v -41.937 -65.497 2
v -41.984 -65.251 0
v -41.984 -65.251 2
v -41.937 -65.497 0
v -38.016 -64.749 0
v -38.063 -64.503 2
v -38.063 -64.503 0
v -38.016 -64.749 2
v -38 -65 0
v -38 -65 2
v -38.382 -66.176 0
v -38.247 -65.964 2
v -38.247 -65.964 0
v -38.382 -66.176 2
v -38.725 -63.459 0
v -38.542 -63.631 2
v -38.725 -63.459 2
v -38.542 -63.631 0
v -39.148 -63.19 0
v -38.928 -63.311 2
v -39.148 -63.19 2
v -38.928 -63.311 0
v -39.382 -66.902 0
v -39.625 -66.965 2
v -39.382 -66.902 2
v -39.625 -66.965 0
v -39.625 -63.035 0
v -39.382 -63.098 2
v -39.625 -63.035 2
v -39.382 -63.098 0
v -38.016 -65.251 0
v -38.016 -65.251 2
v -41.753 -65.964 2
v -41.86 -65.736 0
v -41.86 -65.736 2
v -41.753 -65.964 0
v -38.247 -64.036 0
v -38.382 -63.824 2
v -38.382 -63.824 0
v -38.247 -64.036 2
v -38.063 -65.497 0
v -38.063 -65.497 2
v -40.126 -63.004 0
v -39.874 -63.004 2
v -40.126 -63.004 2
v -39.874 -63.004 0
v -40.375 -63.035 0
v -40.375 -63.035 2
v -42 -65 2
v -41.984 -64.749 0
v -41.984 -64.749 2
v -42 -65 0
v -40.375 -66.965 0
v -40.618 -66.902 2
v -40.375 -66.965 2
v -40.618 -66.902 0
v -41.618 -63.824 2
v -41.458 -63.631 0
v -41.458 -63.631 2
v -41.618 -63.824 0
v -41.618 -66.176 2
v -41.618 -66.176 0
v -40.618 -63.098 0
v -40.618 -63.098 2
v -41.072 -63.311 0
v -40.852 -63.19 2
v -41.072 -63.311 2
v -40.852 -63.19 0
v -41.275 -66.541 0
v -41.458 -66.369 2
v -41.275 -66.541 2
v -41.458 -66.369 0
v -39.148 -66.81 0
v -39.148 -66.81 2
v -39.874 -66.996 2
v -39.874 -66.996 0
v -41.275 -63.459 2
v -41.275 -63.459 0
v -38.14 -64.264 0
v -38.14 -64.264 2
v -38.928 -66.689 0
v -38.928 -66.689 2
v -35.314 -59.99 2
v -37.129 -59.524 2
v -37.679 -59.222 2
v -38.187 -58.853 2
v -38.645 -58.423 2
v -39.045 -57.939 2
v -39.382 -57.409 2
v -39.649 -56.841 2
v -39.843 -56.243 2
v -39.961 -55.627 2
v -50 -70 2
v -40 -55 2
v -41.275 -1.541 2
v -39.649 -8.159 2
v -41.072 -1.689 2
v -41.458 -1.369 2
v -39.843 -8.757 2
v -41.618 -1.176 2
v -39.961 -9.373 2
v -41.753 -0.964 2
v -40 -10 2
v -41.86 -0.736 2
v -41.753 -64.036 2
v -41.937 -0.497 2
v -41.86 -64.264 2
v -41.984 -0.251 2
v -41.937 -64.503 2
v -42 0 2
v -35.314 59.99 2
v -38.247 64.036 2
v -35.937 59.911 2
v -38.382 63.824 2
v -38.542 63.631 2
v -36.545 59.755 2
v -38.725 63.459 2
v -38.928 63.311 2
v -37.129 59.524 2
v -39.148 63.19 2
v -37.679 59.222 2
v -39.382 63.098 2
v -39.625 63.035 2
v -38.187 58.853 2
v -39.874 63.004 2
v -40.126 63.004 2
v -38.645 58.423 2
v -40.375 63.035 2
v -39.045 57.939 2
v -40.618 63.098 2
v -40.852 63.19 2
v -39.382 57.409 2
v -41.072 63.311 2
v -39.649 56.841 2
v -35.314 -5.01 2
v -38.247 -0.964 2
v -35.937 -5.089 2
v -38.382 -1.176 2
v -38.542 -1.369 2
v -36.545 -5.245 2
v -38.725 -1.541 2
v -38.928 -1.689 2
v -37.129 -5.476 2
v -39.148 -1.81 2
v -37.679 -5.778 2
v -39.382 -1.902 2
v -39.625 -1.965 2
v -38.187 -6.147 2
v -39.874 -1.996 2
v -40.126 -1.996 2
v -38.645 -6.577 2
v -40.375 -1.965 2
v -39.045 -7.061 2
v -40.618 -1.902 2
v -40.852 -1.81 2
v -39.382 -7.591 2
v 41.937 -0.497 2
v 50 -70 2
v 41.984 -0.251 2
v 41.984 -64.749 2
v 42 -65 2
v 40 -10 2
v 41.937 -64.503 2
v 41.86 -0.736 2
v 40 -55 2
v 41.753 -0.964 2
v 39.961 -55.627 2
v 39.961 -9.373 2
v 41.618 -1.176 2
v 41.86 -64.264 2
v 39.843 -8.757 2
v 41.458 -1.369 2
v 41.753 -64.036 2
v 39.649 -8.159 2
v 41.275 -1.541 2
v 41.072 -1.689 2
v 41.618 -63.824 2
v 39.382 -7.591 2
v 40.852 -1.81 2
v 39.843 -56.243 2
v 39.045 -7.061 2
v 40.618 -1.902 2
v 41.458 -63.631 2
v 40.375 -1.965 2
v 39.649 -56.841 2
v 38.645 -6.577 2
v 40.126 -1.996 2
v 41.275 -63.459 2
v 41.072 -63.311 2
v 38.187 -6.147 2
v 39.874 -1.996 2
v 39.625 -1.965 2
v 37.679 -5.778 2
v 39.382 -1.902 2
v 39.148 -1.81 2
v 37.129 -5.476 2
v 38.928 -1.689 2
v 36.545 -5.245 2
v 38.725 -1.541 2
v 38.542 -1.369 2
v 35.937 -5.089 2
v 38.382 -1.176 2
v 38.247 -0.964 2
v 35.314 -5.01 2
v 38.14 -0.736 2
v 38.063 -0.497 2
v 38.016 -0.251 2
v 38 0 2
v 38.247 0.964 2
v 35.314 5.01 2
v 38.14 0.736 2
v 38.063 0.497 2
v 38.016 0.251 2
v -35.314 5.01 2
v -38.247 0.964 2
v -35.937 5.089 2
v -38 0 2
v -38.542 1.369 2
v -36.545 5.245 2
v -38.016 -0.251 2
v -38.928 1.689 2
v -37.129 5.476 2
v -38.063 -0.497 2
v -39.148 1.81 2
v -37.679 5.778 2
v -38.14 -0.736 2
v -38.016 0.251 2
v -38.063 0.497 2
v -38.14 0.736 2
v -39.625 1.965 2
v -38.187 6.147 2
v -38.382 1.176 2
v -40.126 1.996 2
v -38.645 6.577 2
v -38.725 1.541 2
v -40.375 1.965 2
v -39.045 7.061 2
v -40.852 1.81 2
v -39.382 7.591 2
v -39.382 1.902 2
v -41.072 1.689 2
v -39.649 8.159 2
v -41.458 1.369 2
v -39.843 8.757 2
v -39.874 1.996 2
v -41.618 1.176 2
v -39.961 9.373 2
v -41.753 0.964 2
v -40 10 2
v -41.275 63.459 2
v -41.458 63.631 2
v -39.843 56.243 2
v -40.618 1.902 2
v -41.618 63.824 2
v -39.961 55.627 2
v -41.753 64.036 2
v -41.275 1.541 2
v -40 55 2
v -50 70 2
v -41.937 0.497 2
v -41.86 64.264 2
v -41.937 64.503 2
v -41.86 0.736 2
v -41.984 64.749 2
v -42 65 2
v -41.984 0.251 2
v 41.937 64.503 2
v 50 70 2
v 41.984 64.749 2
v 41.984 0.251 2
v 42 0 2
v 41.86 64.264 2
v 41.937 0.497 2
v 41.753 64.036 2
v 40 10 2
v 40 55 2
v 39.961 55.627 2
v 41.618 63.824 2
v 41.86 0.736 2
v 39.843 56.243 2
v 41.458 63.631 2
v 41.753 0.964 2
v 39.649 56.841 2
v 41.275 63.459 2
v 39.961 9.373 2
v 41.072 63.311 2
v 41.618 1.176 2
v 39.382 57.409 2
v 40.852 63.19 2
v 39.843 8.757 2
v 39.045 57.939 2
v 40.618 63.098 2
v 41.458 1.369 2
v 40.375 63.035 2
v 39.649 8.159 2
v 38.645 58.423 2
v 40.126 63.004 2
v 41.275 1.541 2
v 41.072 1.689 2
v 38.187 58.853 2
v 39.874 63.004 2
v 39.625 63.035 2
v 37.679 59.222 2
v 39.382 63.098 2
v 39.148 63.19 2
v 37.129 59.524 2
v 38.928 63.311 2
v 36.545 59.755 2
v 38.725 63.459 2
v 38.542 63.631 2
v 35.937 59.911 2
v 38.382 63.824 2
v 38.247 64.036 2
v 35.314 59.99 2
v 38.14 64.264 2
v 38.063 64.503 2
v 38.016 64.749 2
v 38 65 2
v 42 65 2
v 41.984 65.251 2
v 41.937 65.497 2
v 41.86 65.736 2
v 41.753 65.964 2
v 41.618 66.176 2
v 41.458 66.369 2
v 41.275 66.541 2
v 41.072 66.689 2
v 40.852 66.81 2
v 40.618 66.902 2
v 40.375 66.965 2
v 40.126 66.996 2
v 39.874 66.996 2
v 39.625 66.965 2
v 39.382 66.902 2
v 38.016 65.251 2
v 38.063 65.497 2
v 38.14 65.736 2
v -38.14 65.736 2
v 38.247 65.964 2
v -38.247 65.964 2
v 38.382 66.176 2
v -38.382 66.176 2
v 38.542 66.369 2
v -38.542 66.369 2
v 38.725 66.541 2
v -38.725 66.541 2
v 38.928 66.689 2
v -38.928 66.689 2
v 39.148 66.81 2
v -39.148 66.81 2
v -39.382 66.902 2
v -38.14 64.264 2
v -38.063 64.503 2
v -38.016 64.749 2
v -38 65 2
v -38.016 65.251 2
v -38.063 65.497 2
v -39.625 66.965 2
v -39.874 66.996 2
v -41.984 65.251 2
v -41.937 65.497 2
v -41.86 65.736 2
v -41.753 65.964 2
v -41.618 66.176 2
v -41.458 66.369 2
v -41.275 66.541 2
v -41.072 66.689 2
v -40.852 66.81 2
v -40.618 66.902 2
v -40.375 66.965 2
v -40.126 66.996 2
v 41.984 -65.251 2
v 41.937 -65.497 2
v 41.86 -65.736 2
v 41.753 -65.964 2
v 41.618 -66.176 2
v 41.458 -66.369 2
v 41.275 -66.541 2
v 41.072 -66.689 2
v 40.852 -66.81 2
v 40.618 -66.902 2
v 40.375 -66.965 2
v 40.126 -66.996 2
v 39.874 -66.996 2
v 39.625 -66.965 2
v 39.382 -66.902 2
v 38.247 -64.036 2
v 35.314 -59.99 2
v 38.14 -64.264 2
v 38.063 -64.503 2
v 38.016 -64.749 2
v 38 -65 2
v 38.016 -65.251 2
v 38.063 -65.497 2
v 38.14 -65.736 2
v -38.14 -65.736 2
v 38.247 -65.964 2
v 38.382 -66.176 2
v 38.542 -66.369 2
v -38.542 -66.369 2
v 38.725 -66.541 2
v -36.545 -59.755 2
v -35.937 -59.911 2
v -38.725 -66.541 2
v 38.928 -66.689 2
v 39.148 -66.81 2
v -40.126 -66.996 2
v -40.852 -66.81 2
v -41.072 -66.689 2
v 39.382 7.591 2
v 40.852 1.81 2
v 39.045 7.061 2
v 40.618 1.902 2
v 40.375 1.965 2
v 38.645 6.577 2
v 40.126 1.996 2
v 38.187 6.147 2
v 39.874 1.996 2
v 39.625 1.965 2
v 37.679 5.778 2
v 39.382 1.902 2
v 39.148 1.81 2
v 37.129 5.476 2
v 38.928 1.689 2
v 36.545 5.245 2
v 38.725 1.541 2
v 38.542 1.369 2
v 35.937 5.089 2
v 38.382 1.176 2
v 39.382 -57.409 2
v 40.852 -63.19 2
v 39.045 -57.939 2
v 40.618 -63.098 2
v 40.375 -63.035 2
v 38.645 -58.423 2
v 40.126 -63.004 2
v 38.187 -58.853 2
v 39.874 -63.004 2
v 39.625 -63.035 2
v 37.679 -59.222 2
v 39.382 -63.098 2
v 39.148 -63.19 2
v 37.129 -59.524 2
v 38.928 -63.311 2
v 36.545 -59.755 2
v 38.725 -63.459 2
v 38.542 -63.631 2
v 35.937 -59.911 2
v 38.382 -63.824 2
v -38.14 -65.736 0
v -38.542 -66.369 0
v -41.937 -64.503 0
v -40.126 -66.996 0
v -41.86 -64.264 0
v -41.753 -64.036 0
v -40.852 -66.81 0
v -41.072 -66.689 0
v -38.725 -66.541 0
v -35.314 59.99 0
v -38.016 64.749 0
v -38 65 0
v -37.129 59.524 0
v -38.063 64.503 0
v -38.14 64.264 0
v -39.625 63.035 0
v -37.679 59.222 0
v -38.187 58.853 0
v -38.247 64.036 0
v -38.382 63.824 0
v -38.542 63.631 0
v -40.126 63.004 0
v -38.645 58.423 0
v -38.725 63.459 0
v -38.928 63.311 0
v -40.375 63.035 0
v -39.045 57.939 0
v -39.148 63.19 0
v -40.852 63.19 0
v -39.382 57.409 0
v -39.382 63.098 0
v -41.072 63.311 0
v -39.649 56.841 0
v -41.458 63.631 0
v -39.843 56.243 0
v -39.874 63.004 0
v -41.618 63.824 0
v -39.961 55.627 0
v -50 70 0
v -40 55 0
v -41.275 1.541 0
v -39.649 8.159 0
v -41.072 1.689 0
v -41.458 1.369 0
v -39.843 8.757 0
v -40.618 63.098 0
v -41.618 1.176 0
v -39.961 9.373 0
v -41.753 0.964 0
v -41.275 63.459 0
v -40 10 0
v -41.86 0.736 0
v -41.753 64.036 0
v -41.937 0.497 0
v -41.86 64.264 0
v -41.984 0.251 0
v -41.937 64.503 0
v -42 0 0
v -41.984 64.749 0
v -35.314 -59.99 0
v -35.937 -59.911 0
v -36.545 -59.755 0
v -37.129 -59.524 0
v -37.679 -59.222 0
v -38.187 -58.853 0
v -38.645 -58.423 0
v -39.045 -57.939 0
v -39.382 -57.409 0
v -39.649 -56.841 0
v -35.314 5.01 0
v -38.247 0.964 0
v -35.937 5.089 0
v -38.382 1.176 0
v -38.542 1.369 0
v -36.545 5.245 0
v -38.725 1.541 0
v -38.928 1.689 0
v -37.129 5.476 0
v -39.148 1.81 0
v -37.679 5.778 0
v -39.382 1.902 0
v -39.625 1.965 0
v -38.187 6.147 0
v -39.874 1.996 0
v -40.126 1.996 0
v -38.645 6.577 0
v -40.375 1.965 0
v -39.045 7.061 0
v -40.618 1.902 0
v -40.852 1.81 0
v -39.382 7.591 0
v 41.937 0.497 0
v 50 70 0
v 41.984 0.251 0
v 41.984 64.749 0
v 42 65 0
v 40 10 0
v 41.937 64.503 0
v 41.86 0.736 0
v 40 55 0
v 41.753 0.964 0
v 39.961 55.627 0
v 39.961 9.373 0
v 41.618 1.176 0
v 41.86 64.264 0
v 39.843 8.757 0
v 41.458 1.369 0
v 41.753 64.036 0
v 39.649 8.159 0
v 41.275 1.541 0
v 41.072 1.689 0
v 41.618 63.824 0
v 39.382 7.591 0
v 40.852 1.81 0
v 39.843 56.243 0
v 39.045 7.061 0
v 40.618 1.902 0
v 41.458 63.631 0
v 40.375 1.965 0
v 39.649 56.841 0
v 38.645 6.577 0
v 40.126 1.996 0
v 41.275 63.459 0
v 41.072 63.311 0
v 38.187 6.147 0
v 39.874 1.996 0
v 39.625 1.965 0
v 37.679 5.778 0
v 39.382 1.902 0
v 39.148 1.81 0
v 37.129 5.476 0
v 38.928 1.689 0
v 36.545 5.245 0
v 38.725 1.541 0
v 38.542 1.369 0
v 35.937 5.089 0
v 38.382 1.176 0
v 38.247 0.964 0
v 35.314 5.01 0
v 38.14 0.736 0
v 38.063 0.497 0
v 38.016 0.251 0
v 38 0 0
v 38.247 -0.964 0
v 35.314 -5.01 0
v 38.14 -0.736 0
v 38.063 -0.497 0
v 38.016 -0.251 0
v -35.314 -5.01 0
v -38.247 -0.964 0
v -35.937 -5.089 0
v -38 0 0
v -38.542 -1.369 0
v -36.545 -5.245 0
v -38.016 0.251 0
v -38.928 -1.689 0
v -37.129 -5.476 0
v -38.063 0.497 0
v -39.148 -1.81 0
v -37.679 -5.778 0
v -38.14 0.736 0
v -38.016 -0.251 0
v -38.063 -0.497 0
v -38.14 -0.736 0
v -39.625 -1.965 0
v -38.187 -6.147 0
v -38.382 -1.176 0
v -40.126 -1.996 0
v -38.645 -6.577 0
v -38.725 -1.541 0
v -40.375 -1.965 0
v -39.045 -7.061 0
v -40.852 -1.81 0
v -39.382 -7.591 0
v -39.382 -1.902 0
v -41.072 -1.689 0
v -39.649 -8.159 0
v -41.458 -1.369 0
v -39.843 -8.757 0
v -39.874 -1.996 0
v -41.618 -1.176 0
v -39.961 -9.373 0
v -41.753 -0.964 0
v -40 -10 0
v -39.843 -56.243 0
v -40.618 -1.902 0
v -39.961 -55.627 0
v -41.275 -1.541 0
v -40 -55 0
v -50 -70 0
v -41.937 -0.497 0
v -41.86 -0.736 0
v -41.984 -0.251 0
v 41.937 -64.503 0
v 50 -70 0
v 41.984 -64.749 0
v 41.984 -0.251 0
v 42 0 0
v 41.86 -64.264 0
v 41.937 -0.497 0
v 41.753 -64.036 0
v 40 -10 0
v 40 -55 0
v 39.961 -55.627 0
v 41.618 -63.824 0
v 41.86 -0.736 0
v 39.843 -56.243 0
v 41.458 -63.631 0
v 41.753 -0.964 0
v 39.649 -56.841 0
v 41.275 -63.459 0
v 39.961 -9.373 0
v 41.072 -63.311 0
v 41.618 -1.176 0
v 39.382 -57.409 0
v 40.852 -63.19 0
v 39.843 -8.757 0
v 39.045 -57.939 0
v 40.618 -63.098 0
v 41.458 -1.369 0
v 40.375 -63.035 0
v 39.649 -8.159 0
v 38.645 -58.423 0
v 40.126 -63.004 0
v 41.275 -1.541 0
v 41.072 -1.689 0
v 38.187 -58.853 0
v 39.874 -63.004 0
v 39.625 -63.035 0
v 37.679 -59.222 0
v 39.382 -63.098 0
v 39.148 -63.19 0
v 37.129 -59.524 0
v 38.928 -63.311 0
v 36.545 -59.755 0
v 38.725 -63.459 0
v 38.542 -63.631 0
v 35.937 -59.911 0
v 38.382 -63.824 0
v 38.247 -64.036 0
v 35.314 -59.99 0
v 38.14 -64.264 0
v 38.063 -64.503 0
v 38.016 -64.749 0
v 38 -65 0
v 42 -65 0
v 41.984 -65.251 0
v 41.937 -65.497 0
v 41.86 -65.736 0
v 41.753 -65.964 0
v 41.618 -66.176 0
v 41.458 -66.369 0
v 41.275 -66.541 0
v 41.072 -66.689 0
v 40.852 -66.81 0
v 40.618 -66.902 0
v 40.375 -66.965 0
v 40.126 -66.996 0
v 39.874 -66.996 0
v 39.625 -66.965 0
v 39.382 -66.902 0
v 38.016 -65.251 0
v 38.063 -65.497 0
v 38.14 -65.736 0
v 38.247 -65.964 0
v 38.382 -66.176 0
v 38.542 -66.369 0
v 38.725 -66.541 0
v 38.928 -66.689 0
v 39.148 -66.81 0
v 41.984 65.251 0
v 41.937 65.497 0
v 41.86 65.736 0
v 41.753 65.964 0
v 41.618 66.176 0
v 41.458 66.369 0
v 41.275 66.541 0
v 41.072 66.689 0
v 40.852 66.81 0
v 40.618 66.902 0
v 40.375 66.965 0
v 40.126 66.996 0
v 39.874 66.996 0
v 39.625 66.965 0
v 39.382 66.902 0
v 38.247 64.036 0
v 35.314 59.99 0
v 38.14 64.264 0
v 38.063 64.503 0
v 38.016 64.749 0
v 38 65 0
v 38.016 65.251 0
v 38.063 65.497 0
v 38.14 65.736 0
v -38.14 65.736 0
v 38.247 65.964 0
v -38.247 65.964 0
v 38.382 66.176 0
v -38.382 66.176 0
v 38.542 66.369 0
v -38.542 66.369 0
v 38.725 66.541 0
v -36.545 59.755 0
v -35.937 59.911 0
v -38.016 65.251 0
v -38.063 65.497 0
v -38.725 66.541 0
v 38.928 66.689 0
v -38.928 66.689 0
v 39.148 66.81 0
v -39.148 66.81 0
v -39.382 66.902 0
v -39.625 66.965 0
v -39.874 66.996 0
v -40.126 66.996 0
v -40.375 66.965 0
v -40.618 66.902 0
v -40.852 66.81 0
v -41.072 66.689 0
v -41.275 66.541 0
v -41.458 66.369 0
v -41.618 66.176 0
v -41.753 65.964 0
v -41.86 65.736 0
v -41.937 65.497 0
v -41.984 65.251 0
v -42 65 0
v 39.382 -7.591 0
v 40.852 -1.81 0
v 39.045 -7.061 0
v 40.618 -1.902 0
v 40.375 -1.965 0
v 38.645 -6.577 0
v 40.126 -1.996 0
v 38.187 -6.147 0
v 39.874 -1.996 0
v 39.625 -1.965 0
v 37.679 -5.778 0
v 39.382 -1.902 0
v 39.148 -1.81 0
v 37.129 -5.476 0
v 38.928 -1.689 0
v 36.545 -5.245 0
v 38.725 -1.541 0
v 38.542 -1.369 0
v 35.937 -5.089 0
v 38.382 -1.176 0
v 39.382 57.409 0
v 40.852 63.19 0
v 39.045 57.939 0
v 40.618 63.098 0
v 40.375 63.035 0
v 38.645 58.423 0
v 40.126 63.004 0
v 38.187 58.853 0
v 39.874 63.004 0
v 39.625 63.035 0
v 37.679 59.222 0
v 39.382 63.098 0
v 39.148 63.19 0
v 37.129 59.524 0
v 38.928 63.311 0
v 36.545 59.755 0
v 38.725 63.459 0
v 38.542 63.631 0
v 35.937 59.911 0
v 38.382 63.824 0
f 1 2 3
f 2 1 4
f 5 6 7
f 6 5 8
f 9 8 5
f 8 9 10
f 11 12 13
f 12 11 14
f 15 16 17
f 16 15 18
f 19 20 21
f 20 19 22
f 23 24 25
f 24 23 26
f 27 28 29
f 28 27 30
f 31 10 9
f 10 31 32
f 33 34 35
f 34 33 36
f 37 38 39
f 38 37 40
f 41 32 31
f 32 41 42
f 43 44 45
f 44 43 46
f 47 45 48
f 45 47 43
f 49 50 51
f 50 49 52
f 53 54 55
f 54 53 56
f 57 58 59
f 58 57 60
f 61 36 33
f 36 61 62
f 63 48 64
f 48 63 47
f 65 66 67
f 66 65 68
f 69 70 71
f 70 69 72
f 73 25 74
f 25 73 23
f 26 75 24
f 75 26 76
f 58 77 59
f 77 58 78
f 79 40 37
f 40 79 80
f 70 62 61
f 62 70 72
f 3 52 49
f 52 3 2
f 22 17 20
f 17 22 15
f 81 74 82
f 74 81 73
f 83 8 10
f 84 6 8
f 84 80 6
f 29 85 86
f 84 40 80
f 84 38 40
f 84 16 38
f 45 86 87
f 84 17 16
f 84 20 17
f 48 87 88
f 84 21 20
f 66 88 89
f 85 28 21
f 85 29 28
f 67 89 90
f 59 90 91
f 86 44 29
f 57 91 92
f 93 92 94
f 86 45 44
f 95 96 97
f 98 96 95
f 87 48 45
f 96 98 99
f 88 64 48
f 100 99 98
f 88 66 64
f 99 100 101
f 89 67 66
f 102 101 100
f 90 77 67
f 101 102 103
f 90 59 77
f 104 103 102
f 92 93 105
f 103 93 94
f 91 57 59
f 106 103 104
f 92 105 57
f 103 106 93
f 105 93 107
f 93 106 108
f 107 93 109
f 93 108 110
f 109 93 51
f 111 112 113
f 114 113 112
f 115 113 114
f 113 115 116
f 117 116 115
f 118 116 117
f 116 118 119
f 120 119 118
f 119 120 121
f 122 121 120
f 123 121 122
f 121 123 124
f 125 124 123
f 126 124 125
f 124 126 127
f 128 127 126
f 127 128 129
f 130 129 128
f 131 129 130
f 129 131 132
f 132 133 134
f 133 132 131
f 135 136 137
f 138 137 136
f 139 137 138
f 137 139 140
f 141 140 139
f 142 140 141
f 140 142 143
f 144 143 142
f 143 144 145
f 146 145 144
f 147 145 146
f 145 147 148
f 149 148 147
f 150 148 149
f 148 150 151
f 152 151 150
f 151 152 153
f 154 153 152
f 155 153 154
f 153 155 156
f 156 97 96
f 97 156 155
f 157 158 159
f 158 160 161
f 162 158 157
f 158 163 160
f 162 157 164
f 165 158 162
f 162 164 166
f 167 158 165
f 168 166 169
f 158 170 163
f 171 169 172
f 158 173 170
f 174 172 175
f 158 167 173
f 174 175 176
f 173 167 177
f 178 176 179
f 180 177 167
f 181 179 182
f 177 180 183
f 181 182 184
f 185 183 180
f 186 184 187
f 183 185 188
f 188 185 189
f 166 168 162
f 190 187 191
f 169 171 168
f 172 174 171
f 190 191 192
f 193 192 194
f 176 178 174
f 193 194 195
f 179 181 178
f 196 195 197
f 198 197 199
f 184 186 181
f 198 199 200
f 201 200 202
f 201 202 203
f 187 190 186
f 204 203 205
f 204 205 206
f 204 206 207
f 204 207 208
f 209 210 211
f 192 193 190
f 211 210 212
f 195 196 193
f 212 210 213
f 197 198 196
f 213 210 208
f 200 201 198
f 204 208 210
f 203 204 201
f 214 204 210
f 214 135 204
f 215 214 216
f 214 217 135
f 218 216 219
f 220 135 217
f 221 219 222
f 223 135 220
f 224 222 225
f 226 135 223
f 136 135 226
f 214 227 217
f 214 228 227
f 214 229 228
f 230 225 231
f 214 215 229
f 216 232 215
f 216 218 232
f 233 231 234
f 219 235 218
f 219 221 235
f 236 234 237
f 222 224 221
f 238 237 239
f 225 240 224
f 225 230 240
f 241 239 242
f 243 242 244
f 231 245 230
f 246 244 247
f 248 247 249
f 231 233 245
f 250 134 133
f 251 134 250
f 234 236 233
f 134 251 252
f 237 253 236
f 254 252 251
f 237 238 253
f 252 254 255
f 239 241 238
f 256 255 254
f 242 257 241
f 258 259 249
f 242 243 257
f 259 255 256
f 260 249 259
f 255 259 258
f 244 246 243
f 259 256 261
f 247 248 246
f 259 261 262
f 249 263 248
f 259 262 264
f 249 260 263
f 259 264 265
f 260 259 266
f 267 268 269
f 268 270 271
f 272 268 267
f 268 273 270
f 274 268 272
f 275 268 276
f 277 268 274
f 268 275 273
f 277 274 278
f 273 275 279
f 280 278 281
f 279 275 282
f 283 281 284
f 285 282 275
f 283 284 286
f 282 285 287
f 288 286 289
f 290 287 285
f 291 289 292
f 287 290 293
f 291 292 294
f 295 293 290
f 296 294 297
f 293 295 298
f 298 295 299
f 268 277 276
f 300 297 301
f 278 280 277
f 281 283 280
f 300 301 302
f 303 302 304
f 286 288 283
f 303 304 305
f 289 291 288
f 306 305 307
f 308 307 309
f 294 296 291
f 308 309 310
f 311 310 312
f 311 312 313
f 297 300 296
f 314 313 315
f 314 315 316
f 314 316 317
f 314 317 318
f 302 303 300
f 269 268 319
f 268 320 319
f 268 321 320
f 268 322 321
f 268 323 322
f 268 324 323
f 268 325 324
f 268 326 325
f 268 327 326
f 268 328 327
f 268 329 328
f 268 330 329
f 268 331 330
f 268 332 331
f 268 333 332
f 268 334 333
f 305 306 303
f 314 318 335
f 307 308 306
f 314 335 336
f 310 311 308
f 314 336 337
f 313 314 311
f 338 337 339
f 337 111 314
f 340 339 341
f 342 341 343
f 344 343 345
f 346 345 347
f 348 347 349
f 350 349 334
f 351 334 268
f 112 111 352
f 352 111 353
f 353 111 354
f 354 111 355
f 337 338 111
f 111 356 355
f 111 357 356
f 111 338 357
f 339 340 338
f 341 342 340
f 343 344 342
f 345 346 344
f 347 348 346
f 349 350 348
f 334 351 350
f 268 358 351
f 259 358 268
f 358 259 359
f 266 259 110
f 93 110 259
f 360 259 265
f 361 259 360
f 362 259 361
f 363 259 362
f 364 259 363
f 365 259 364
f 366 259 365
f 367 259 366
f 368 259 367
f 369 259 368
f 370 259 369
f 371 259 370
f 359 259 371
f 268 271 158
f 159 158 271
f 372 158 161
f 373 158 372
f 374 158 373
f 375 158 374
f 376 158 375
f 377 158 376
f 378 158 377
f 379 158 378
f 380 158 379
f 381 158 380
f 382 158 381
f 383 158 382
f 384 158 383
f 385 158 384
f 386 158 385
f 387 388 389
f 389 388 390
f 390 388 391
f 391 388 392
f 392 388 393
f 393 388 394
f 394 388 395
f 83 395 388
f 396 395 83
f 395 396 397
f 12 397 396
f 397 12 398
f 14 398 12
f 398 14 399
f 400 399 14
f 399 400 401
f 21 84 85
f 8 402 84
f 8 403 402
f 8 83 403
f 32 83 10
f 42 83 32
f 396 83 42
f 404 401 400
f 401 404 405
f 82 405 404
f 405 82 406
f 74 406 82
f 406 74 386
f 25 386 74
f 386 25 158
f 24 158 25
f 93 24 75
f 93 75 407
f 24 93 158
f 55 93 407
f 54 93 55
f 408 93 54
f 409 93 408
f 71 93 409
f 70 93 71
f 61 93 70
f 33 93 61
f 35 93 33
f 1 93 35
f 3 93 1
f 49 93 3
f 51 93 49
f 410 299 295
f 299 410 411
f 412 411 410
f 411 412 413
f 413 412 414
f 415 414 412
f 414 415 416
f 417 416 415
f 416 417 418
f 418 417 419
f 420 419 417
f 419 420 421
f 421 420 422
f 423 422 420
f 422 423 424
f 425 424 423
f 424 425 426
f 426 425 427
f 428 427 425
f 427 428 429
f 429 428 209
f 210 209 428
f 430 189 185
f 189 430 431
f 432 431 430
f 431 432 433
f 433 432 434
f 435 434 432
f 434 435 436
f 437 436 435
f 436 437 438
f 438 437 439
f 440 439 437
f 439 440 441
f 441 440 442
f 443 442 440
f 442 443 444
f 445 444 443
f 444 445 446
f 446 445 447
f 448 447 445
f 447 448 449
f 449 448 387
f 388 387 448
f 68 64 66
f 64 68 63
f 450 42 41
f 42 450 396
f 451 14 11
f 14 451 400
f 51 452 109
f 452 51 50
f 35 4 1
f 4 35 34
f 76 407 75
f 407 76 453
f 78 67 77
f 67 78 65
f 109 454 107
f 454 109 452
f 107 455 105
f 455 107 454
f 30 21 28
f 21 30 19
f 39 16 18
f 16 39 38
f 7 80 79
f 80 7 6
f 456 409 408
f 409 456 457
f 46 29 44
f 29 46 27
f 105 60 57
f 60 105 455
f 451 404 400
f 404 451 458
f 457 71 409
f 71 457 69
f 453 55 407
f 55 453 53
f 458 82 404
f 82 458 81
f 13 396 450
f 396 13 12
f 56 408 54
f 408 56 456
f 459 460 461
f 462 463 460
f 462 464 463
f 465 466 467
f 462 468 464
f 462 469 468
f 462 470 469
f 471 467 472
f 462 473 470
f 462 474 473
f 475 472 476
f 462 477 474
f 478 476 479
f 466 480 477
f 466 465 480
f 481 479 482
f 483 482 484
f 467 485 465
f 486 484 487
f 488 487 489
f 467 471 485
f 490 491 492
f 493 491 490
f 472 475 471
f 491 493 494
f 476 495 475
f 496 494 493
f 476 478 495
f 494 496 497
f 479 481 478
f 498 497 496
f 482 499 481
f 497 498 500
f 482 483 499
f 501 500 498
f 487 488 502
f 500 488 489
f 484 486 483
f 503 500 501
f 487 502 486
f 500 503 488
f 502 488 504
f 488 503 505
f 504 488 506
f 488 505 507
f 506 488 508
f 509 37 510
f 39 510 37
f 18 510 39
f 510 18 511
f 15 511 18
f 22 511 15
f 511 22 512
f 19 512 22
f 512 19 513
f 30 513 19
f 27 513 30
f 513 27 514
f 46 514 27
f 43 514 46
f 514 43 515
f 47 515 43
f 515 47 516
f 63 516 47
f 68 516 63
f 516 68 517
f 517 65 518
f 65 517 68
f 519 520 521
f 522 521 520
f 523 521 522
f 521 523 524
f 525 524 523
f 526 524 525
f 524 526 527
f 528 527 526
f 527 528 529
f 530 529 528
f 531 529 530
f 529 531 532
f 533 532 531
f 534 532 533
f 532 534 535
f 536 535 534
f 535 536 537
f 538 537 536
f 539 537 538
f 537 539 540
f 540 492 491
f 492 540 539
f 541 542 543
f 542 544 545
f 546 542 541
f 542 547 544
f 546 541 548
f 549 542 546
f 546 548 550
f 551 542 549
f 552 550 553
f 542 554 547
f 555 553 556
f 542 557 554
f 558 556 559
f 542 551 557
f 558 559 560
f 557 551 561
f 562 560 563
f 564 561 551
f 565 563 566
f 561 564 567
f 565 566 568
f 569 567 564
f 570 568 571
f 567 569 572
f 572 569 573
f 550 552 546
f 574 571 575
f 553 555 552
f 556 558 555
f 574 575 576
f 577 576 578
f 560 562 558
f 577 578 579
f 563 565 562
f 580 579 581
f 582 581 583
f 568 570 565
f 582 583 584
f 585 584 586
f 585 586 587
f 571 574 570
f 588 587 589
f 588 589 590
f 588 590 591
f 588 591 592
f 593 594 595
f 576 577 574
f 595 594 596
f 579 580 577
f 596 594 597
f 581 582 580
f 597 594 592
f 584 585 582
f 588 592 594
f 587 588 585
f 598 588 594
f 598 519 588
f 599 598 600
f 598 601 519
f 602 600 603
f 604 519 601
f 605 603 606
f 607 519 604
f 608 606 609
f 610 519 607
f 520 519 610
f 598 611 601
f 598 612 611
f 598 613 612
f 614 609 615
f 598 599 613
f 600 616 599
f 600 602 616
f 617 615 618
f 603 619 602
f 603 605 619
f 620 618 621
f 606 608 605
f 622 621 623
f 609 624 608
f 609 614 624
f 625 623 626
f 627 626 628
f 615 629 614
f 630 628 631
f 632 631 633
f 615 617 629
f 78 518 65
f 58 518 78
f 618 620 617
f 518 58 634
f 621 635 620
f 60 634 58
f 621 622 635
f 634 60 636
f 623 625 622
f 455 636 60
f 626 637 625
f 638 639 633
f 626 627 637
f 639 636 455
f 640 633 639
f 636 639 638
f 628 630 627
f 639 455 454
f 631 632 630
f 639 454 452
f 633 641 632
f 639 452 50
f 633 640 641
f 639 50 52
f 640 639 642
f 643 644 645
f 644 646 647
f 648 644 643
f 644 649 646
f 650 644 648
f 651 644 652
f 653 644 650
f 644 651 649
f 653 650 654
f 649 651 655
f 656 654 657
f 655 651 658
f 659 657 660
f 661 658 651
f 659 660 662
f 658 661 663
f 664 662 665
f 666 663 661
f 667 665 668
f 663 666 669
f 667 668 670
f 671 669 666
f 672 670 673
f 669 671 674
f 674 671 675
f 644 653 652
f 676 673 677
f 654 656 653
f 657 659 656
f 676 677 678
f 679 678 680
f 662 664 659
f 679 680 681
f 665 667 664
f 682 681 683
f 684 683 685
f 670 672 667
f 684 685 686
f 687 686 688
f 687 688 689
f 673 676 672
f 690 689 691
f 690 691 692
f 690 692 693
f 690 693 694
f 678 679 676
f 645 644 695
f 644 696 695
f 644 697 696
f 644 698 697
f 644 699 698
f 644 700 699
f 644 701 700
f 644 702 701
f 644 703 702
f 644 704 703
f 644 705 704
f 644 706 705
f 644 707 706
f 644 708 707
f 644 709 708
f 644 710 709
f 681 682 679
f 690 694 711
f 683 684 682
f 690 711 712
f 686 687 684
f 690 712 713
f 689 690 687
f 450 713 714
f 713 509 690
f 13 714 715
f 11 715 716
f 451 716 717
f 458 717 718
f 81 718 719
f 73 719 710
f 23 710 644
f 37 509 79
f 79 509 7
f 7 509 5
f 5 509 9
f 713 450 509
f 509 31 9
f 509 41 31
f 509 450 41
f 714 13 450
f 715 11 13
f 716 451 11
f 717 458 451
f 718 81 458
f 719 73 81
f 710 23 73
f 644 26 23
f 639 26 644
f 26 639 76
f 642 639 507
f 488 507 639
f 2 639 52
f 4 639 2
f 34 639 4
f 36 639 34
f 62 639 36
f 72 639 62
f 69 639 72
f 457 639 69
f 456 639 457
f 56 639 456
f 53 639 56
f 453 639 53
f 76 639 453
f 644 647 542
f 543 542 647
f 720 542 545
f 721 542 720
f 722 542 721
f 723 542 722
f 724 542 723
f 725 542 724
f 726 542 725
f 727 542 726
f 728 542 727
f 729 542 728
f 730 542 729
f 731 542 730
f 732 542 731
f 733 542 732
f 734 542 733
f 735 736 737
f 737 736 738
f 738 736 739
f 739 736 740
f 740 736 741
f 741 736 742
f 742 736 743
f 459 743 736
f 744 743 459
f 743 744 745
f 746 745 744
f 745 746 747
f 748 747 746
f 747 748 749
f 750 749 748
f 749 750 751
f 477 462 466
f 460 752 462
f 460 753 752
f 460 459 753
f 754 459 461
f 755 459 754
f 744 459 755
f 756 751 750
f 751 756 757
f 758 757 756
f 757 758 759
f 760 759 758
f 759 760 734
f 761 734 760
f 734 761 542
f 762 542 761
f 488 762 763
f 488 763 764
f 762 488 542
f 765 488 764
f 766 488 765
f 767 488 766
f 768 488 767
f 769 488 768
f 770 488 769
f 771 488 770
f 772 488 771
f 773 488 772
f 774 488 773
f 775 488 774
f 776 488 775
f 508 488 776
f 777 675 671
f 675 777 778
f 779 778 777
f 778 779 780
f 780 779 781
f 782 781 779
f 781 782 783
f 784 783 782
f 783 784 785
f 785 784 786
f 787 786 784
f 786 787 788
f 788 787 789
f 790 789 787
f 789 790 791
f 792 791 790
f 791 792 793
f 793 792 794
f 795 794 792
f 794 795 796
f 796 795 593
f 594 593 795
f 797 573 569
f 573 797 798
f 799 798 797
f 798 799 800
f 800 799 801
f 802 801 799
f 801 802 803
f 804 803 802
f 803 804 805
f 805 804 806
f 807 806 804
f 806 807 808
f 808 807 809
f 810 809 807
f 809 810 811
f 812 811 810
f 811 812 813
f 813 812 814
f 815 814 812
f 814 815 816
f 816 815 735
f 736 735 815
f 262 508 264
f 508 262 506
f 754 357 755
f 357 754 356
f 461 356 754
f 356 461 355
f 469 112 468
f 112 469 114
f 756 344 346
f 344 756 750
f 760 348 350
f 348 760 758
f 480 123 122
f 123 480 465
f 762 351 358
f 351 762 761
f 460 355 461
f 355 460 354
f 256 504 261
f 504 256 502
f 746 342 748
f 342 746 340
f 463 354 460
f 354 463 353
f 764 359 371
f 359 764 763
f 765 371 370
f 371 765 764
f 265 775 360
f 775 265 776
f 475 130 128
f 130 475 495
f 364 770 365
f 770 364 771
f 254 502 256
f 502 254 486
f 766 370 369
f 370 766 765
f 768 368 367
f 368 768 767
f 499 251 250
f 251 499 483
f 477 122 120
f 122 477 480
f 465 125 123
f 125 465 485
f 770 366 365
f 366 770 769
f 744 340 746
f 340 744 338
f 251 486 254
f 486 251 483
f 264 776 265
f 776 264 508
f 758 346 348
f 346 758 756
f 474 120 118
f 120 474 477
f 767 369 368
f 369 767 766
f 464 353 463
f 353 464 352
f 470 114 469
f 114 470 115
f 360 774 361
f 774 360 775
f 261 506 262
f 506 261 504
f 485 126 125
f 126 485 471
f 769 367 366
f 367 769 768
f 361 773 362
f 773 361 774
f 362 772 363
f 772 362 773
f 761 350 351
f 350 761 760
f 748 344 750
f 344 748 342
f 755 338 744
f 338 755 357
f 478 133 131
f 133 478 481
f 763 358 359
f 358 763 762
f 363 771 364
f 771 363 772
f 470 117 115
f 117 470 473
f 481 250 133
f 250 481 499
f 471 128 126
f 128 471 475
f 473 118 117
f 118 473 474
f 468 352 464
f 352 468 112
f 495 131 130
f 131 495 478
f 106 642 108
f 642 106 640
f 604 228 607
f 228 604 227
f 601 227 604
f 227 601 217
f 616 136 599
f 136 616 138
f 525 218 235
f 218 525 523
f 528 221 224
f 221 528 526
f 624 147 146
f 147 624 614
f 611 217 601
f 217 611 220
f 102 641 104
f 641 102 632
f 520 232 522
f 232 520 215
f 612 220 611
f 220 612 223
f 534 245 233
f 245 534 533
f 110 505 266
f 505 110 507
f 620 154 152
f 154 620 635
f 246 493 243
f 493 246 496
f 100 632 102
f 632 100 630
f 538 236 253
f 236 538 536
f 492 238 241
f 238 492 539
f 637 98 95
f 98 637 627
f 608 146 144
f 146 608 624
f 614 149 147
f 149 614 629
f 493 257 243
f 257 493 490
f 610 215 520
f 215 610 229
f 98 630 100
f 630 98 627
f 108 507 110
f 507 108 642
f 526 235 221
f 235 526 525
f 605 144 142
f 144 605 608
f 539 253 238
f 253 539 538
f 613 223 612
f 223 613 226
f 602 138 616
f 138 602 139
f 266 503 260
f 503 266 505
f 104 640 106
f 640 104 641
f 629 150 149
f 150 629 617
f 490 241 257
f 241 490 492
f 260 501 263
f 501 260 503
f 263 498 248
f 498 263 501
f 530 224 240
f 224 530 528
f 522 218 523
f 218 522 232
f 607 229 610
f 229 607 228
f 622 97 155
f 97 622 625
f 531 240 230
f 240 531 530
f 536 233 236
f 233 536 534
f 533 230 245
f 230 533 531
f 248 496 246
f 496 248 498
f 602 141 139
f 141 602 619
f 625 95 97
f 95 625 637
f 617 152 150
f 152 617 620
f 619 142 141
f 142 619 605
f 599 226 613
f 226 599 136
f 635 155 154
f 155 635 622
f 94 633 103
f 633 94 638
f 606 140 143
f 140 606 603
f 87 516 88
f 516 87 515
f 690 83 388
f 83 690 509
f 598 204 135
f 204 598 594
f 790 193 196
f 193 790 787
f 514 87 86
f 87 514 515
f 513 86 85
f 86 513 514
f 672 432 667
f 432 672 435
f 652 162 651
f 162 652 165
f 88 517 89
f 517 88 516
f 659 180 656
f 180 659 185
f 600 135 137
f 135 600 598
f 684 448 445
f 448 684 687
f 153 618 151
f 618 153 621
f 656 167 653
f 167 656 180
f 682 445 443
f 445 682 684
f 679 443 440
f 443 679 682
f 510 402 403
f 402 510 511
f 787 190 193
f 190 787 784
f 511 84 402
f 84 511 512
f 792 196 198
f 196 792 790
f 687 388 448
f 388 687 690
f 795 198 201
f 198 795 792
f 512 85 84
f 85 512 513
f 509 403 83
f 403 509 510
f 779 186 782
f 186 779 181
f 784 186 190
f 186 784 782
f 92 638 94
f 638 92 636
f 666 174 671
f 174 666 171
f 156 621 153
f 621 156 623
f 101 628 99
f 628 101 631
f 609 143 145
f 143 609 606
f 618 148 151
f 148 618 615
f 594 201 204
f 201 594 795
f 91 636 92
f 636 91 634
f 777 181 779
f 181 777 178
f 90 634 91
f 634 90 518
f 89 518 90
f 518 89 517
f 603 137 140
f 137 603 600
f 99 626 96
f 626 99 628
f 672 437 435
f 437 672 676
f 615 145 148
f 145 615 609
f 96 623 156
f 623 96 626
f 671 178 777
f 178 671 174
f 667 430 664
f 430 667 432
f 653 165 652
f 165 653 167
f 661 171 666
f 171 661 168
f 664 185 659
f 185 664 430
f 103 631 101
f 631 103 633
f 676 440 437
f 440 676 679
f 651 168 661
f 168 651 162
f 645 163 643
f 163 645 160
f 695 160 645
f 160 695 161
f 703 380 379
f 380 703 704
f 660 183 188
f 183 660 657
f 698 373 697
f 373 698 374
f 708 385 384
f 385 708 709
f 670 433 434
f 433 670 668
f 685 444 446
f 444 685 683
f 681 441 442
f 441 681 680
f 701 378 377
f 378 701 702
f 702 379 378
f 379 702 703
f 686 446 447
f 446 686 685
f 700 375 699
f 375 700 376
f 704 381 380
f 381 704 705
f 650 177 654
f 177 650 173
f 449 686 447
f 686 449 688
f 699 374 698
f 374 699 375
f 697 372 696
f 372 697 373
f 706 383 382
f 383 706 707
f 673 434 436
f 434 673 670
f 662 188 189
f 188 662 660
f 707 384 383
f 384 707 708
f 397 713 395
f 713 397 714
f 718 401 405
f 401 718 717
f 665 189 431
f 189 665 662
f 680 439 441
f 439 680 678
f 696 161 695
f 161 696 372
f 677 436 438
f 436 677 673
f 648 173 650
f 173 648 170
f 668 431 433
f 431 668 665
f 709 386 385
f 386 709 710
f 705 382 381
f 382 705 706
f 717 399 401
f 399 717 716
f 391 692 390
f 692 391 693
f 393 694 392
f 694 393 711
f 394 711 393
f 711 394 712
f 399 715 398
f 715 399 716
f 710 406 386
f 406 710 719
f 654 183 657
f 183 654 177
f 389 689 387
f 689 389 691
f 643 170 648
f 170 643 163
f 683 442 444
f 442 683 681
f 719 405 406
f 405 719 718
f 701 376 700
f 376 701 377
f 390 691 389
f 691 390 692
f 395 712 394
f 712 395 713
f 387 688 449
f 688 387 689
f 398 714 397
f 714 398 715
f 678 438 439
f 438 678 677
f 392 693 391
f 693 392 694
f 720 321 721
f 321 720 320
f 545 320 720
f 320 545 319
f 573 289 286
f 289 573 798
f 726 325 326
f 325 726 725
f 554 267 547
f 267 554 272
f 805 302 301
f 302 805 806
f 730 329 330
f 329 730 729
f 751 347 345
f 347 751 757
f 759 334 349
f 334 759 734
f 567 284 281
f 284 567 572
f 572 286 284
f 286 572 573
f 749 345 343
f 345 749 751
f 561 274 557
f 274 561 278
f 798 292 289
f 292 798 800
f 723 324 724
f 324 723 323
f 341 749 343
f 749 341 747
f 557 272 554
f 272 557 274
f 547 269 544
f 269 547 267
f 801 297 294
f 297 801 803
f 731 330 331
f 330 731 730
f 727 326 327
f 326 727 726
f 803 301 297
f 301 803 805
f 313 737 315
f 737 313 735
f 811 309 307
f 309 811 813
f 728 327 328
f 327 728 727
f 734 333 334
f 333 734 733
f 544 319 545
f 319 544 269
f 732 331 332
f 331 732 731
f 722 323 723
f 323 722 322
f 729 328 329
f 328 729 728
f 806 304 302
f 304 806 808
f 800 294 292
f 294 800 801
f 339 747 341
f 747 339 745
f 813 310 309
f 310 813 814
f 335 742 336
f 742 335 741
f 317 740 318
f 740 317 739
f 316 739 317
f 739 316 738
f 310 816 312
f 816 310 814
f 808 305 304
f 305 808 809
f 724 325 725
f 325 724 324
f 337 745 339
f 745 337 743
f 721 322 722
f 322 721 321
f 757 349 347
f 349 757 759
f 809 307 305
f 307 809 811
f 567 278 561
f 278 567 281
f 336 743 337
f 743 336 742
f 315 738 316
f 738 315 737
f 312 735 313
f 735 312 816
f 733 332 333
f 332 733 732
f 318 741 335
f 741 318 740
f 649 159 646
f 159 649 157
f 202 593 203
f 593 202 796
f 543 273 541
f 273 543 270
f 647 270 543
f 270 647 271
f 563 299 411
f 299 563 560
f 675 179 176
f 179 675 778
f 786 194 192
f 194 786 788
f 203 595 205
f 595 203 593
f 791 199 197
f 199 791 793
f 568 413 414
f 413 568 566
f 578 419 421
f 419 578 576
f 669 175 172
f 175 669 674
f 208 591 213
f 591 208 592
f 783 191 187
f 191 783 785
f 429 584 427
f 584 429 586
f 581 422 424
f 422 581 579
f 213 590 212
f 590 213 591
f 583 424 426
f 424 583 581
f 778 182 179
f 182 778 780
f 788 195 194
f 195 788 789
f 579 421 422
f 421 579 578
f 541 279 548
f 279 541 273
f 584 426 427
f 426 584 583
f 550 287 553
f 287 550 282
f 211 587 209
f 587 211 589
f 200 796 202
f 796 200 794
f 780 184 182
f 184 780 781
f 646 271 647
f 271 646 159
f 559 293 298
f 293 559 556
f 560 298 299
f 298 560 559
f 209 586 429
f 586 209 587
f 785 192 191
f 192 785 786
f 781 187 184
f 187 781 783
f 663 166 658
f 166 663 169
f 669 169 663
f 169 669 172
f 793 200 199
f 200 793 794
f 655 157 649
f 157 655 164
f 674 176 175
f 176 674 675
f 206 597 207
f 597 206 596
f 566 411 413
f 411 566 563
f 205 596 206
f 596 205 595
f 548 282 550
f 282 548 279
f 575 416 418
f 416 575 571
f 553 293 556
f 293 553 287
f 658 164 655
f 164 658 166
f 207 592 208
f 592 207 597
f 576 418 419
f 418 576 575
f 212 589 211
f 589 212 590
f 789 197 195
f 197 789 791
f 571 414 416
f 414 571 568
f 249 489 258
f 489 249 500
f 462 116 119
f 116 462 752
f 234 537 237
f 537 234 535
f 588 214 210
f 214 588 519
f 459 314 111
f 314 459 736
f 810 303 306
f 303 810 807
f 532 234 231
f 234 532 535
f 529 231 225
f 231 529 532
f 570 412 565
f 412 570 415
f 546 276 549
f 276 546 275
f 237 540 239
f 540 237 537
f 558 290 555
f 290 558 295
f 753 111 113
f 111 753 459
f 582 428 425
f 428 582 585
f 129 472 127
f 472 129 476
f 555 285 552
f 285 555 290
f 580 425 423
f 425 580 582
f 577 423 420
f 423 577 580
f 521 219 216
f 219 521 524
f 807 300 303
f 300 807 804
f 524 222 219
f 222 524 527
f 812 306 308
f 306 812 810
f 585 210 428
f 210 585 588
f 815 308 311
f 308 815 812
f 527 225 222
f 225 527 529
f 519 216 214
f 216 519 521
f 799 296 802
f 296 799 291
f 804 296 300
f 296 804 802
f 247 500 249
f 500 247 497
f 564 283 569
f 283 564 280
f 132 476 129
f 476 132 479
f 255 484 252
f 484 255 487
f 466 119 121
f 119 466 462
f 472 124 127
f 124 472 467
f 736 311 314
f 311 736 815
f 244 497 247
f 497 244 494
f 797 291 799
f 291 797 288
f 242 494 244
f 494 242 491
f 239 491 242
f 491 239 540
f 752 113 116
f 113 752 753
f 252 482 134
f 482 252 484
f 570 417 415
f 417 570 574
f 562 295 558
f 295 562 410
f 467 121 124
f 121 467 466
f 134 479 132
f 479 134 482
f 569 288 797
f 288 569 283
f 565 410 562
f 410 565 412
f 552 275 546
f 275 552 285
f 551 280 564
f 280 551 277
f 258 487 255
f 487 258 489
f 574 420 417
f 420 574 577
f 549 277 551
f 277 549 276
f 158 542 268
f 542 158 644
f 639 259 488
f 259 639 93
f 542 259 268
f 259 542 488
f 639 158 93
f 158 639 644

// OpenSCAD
FRAME_WIDTH = 100;
FRAME_LENGTH = 140;
FRAME_THICKNESS = 2;

MOUNT_HOLE_DIA = 4;
MOUNT_HOLE_SPACING_X = 80;
MOUNT_HOLE_SPACING_Y = 130;

HOLE_CORNER_DIA = 10;
HOLE_WIDTH = FRAME_WIDTH - 20;
HOLE_LENGTH = (FRAME_LENGTH - 30)/2;
HOLE_SPACING = HOLE_LENGTH + 10;

$fn = 50;

module hole() {
  hull() {
    for(i = [-1, 1]) {
      for(j = [-1, 1]) {
        translate([i * (HOLE_WIDTH-HOLE_CORNER_DIA)/2, j * (HOLE_LENGTH-HOLE_CORNER_DIA)/2, 0])
        cylinder(d = HOLE_CORNER_DIA, h = FRAME_THICKNESS);
      }
    }
  }
}

module frame() {
  difference() {
    translate([-FRAME_WIDTH/2, -FRAME_LENGTH/2, 0])
    cube(size = [FRAME_WIDTH, FRAME_LENGTH, FRAME_THICKNESS]);
    
    for(i = [-1, 1]) {
      translate([i * MOUNT_HOLE_SPACING_X/2, -MOUNT_HOLE_SPACING_Y/2, 0])
      cylinder(d = MOUNT_HOLE_DIA, h = FRAME_THICKNESS);

      translate([i * MOUNT_HOLE_SPACING_X/2, MOUNT_HOLE_SPACING_Y/2, 0])
      cylinder(d = MOUNT_HOLE_DIA, h = FRAME_THICKNESS);

      translate([i * MOUNT_HOLE_SPACING_X/2, 0, 0])
      cylinder(d = MOUNT_HOLE_DIA, h = FRAME_THICKNESS);
      
      translate([0, i * HOLE_SPACING/2, 0])
      hole();
    }
  }
}

frame();
